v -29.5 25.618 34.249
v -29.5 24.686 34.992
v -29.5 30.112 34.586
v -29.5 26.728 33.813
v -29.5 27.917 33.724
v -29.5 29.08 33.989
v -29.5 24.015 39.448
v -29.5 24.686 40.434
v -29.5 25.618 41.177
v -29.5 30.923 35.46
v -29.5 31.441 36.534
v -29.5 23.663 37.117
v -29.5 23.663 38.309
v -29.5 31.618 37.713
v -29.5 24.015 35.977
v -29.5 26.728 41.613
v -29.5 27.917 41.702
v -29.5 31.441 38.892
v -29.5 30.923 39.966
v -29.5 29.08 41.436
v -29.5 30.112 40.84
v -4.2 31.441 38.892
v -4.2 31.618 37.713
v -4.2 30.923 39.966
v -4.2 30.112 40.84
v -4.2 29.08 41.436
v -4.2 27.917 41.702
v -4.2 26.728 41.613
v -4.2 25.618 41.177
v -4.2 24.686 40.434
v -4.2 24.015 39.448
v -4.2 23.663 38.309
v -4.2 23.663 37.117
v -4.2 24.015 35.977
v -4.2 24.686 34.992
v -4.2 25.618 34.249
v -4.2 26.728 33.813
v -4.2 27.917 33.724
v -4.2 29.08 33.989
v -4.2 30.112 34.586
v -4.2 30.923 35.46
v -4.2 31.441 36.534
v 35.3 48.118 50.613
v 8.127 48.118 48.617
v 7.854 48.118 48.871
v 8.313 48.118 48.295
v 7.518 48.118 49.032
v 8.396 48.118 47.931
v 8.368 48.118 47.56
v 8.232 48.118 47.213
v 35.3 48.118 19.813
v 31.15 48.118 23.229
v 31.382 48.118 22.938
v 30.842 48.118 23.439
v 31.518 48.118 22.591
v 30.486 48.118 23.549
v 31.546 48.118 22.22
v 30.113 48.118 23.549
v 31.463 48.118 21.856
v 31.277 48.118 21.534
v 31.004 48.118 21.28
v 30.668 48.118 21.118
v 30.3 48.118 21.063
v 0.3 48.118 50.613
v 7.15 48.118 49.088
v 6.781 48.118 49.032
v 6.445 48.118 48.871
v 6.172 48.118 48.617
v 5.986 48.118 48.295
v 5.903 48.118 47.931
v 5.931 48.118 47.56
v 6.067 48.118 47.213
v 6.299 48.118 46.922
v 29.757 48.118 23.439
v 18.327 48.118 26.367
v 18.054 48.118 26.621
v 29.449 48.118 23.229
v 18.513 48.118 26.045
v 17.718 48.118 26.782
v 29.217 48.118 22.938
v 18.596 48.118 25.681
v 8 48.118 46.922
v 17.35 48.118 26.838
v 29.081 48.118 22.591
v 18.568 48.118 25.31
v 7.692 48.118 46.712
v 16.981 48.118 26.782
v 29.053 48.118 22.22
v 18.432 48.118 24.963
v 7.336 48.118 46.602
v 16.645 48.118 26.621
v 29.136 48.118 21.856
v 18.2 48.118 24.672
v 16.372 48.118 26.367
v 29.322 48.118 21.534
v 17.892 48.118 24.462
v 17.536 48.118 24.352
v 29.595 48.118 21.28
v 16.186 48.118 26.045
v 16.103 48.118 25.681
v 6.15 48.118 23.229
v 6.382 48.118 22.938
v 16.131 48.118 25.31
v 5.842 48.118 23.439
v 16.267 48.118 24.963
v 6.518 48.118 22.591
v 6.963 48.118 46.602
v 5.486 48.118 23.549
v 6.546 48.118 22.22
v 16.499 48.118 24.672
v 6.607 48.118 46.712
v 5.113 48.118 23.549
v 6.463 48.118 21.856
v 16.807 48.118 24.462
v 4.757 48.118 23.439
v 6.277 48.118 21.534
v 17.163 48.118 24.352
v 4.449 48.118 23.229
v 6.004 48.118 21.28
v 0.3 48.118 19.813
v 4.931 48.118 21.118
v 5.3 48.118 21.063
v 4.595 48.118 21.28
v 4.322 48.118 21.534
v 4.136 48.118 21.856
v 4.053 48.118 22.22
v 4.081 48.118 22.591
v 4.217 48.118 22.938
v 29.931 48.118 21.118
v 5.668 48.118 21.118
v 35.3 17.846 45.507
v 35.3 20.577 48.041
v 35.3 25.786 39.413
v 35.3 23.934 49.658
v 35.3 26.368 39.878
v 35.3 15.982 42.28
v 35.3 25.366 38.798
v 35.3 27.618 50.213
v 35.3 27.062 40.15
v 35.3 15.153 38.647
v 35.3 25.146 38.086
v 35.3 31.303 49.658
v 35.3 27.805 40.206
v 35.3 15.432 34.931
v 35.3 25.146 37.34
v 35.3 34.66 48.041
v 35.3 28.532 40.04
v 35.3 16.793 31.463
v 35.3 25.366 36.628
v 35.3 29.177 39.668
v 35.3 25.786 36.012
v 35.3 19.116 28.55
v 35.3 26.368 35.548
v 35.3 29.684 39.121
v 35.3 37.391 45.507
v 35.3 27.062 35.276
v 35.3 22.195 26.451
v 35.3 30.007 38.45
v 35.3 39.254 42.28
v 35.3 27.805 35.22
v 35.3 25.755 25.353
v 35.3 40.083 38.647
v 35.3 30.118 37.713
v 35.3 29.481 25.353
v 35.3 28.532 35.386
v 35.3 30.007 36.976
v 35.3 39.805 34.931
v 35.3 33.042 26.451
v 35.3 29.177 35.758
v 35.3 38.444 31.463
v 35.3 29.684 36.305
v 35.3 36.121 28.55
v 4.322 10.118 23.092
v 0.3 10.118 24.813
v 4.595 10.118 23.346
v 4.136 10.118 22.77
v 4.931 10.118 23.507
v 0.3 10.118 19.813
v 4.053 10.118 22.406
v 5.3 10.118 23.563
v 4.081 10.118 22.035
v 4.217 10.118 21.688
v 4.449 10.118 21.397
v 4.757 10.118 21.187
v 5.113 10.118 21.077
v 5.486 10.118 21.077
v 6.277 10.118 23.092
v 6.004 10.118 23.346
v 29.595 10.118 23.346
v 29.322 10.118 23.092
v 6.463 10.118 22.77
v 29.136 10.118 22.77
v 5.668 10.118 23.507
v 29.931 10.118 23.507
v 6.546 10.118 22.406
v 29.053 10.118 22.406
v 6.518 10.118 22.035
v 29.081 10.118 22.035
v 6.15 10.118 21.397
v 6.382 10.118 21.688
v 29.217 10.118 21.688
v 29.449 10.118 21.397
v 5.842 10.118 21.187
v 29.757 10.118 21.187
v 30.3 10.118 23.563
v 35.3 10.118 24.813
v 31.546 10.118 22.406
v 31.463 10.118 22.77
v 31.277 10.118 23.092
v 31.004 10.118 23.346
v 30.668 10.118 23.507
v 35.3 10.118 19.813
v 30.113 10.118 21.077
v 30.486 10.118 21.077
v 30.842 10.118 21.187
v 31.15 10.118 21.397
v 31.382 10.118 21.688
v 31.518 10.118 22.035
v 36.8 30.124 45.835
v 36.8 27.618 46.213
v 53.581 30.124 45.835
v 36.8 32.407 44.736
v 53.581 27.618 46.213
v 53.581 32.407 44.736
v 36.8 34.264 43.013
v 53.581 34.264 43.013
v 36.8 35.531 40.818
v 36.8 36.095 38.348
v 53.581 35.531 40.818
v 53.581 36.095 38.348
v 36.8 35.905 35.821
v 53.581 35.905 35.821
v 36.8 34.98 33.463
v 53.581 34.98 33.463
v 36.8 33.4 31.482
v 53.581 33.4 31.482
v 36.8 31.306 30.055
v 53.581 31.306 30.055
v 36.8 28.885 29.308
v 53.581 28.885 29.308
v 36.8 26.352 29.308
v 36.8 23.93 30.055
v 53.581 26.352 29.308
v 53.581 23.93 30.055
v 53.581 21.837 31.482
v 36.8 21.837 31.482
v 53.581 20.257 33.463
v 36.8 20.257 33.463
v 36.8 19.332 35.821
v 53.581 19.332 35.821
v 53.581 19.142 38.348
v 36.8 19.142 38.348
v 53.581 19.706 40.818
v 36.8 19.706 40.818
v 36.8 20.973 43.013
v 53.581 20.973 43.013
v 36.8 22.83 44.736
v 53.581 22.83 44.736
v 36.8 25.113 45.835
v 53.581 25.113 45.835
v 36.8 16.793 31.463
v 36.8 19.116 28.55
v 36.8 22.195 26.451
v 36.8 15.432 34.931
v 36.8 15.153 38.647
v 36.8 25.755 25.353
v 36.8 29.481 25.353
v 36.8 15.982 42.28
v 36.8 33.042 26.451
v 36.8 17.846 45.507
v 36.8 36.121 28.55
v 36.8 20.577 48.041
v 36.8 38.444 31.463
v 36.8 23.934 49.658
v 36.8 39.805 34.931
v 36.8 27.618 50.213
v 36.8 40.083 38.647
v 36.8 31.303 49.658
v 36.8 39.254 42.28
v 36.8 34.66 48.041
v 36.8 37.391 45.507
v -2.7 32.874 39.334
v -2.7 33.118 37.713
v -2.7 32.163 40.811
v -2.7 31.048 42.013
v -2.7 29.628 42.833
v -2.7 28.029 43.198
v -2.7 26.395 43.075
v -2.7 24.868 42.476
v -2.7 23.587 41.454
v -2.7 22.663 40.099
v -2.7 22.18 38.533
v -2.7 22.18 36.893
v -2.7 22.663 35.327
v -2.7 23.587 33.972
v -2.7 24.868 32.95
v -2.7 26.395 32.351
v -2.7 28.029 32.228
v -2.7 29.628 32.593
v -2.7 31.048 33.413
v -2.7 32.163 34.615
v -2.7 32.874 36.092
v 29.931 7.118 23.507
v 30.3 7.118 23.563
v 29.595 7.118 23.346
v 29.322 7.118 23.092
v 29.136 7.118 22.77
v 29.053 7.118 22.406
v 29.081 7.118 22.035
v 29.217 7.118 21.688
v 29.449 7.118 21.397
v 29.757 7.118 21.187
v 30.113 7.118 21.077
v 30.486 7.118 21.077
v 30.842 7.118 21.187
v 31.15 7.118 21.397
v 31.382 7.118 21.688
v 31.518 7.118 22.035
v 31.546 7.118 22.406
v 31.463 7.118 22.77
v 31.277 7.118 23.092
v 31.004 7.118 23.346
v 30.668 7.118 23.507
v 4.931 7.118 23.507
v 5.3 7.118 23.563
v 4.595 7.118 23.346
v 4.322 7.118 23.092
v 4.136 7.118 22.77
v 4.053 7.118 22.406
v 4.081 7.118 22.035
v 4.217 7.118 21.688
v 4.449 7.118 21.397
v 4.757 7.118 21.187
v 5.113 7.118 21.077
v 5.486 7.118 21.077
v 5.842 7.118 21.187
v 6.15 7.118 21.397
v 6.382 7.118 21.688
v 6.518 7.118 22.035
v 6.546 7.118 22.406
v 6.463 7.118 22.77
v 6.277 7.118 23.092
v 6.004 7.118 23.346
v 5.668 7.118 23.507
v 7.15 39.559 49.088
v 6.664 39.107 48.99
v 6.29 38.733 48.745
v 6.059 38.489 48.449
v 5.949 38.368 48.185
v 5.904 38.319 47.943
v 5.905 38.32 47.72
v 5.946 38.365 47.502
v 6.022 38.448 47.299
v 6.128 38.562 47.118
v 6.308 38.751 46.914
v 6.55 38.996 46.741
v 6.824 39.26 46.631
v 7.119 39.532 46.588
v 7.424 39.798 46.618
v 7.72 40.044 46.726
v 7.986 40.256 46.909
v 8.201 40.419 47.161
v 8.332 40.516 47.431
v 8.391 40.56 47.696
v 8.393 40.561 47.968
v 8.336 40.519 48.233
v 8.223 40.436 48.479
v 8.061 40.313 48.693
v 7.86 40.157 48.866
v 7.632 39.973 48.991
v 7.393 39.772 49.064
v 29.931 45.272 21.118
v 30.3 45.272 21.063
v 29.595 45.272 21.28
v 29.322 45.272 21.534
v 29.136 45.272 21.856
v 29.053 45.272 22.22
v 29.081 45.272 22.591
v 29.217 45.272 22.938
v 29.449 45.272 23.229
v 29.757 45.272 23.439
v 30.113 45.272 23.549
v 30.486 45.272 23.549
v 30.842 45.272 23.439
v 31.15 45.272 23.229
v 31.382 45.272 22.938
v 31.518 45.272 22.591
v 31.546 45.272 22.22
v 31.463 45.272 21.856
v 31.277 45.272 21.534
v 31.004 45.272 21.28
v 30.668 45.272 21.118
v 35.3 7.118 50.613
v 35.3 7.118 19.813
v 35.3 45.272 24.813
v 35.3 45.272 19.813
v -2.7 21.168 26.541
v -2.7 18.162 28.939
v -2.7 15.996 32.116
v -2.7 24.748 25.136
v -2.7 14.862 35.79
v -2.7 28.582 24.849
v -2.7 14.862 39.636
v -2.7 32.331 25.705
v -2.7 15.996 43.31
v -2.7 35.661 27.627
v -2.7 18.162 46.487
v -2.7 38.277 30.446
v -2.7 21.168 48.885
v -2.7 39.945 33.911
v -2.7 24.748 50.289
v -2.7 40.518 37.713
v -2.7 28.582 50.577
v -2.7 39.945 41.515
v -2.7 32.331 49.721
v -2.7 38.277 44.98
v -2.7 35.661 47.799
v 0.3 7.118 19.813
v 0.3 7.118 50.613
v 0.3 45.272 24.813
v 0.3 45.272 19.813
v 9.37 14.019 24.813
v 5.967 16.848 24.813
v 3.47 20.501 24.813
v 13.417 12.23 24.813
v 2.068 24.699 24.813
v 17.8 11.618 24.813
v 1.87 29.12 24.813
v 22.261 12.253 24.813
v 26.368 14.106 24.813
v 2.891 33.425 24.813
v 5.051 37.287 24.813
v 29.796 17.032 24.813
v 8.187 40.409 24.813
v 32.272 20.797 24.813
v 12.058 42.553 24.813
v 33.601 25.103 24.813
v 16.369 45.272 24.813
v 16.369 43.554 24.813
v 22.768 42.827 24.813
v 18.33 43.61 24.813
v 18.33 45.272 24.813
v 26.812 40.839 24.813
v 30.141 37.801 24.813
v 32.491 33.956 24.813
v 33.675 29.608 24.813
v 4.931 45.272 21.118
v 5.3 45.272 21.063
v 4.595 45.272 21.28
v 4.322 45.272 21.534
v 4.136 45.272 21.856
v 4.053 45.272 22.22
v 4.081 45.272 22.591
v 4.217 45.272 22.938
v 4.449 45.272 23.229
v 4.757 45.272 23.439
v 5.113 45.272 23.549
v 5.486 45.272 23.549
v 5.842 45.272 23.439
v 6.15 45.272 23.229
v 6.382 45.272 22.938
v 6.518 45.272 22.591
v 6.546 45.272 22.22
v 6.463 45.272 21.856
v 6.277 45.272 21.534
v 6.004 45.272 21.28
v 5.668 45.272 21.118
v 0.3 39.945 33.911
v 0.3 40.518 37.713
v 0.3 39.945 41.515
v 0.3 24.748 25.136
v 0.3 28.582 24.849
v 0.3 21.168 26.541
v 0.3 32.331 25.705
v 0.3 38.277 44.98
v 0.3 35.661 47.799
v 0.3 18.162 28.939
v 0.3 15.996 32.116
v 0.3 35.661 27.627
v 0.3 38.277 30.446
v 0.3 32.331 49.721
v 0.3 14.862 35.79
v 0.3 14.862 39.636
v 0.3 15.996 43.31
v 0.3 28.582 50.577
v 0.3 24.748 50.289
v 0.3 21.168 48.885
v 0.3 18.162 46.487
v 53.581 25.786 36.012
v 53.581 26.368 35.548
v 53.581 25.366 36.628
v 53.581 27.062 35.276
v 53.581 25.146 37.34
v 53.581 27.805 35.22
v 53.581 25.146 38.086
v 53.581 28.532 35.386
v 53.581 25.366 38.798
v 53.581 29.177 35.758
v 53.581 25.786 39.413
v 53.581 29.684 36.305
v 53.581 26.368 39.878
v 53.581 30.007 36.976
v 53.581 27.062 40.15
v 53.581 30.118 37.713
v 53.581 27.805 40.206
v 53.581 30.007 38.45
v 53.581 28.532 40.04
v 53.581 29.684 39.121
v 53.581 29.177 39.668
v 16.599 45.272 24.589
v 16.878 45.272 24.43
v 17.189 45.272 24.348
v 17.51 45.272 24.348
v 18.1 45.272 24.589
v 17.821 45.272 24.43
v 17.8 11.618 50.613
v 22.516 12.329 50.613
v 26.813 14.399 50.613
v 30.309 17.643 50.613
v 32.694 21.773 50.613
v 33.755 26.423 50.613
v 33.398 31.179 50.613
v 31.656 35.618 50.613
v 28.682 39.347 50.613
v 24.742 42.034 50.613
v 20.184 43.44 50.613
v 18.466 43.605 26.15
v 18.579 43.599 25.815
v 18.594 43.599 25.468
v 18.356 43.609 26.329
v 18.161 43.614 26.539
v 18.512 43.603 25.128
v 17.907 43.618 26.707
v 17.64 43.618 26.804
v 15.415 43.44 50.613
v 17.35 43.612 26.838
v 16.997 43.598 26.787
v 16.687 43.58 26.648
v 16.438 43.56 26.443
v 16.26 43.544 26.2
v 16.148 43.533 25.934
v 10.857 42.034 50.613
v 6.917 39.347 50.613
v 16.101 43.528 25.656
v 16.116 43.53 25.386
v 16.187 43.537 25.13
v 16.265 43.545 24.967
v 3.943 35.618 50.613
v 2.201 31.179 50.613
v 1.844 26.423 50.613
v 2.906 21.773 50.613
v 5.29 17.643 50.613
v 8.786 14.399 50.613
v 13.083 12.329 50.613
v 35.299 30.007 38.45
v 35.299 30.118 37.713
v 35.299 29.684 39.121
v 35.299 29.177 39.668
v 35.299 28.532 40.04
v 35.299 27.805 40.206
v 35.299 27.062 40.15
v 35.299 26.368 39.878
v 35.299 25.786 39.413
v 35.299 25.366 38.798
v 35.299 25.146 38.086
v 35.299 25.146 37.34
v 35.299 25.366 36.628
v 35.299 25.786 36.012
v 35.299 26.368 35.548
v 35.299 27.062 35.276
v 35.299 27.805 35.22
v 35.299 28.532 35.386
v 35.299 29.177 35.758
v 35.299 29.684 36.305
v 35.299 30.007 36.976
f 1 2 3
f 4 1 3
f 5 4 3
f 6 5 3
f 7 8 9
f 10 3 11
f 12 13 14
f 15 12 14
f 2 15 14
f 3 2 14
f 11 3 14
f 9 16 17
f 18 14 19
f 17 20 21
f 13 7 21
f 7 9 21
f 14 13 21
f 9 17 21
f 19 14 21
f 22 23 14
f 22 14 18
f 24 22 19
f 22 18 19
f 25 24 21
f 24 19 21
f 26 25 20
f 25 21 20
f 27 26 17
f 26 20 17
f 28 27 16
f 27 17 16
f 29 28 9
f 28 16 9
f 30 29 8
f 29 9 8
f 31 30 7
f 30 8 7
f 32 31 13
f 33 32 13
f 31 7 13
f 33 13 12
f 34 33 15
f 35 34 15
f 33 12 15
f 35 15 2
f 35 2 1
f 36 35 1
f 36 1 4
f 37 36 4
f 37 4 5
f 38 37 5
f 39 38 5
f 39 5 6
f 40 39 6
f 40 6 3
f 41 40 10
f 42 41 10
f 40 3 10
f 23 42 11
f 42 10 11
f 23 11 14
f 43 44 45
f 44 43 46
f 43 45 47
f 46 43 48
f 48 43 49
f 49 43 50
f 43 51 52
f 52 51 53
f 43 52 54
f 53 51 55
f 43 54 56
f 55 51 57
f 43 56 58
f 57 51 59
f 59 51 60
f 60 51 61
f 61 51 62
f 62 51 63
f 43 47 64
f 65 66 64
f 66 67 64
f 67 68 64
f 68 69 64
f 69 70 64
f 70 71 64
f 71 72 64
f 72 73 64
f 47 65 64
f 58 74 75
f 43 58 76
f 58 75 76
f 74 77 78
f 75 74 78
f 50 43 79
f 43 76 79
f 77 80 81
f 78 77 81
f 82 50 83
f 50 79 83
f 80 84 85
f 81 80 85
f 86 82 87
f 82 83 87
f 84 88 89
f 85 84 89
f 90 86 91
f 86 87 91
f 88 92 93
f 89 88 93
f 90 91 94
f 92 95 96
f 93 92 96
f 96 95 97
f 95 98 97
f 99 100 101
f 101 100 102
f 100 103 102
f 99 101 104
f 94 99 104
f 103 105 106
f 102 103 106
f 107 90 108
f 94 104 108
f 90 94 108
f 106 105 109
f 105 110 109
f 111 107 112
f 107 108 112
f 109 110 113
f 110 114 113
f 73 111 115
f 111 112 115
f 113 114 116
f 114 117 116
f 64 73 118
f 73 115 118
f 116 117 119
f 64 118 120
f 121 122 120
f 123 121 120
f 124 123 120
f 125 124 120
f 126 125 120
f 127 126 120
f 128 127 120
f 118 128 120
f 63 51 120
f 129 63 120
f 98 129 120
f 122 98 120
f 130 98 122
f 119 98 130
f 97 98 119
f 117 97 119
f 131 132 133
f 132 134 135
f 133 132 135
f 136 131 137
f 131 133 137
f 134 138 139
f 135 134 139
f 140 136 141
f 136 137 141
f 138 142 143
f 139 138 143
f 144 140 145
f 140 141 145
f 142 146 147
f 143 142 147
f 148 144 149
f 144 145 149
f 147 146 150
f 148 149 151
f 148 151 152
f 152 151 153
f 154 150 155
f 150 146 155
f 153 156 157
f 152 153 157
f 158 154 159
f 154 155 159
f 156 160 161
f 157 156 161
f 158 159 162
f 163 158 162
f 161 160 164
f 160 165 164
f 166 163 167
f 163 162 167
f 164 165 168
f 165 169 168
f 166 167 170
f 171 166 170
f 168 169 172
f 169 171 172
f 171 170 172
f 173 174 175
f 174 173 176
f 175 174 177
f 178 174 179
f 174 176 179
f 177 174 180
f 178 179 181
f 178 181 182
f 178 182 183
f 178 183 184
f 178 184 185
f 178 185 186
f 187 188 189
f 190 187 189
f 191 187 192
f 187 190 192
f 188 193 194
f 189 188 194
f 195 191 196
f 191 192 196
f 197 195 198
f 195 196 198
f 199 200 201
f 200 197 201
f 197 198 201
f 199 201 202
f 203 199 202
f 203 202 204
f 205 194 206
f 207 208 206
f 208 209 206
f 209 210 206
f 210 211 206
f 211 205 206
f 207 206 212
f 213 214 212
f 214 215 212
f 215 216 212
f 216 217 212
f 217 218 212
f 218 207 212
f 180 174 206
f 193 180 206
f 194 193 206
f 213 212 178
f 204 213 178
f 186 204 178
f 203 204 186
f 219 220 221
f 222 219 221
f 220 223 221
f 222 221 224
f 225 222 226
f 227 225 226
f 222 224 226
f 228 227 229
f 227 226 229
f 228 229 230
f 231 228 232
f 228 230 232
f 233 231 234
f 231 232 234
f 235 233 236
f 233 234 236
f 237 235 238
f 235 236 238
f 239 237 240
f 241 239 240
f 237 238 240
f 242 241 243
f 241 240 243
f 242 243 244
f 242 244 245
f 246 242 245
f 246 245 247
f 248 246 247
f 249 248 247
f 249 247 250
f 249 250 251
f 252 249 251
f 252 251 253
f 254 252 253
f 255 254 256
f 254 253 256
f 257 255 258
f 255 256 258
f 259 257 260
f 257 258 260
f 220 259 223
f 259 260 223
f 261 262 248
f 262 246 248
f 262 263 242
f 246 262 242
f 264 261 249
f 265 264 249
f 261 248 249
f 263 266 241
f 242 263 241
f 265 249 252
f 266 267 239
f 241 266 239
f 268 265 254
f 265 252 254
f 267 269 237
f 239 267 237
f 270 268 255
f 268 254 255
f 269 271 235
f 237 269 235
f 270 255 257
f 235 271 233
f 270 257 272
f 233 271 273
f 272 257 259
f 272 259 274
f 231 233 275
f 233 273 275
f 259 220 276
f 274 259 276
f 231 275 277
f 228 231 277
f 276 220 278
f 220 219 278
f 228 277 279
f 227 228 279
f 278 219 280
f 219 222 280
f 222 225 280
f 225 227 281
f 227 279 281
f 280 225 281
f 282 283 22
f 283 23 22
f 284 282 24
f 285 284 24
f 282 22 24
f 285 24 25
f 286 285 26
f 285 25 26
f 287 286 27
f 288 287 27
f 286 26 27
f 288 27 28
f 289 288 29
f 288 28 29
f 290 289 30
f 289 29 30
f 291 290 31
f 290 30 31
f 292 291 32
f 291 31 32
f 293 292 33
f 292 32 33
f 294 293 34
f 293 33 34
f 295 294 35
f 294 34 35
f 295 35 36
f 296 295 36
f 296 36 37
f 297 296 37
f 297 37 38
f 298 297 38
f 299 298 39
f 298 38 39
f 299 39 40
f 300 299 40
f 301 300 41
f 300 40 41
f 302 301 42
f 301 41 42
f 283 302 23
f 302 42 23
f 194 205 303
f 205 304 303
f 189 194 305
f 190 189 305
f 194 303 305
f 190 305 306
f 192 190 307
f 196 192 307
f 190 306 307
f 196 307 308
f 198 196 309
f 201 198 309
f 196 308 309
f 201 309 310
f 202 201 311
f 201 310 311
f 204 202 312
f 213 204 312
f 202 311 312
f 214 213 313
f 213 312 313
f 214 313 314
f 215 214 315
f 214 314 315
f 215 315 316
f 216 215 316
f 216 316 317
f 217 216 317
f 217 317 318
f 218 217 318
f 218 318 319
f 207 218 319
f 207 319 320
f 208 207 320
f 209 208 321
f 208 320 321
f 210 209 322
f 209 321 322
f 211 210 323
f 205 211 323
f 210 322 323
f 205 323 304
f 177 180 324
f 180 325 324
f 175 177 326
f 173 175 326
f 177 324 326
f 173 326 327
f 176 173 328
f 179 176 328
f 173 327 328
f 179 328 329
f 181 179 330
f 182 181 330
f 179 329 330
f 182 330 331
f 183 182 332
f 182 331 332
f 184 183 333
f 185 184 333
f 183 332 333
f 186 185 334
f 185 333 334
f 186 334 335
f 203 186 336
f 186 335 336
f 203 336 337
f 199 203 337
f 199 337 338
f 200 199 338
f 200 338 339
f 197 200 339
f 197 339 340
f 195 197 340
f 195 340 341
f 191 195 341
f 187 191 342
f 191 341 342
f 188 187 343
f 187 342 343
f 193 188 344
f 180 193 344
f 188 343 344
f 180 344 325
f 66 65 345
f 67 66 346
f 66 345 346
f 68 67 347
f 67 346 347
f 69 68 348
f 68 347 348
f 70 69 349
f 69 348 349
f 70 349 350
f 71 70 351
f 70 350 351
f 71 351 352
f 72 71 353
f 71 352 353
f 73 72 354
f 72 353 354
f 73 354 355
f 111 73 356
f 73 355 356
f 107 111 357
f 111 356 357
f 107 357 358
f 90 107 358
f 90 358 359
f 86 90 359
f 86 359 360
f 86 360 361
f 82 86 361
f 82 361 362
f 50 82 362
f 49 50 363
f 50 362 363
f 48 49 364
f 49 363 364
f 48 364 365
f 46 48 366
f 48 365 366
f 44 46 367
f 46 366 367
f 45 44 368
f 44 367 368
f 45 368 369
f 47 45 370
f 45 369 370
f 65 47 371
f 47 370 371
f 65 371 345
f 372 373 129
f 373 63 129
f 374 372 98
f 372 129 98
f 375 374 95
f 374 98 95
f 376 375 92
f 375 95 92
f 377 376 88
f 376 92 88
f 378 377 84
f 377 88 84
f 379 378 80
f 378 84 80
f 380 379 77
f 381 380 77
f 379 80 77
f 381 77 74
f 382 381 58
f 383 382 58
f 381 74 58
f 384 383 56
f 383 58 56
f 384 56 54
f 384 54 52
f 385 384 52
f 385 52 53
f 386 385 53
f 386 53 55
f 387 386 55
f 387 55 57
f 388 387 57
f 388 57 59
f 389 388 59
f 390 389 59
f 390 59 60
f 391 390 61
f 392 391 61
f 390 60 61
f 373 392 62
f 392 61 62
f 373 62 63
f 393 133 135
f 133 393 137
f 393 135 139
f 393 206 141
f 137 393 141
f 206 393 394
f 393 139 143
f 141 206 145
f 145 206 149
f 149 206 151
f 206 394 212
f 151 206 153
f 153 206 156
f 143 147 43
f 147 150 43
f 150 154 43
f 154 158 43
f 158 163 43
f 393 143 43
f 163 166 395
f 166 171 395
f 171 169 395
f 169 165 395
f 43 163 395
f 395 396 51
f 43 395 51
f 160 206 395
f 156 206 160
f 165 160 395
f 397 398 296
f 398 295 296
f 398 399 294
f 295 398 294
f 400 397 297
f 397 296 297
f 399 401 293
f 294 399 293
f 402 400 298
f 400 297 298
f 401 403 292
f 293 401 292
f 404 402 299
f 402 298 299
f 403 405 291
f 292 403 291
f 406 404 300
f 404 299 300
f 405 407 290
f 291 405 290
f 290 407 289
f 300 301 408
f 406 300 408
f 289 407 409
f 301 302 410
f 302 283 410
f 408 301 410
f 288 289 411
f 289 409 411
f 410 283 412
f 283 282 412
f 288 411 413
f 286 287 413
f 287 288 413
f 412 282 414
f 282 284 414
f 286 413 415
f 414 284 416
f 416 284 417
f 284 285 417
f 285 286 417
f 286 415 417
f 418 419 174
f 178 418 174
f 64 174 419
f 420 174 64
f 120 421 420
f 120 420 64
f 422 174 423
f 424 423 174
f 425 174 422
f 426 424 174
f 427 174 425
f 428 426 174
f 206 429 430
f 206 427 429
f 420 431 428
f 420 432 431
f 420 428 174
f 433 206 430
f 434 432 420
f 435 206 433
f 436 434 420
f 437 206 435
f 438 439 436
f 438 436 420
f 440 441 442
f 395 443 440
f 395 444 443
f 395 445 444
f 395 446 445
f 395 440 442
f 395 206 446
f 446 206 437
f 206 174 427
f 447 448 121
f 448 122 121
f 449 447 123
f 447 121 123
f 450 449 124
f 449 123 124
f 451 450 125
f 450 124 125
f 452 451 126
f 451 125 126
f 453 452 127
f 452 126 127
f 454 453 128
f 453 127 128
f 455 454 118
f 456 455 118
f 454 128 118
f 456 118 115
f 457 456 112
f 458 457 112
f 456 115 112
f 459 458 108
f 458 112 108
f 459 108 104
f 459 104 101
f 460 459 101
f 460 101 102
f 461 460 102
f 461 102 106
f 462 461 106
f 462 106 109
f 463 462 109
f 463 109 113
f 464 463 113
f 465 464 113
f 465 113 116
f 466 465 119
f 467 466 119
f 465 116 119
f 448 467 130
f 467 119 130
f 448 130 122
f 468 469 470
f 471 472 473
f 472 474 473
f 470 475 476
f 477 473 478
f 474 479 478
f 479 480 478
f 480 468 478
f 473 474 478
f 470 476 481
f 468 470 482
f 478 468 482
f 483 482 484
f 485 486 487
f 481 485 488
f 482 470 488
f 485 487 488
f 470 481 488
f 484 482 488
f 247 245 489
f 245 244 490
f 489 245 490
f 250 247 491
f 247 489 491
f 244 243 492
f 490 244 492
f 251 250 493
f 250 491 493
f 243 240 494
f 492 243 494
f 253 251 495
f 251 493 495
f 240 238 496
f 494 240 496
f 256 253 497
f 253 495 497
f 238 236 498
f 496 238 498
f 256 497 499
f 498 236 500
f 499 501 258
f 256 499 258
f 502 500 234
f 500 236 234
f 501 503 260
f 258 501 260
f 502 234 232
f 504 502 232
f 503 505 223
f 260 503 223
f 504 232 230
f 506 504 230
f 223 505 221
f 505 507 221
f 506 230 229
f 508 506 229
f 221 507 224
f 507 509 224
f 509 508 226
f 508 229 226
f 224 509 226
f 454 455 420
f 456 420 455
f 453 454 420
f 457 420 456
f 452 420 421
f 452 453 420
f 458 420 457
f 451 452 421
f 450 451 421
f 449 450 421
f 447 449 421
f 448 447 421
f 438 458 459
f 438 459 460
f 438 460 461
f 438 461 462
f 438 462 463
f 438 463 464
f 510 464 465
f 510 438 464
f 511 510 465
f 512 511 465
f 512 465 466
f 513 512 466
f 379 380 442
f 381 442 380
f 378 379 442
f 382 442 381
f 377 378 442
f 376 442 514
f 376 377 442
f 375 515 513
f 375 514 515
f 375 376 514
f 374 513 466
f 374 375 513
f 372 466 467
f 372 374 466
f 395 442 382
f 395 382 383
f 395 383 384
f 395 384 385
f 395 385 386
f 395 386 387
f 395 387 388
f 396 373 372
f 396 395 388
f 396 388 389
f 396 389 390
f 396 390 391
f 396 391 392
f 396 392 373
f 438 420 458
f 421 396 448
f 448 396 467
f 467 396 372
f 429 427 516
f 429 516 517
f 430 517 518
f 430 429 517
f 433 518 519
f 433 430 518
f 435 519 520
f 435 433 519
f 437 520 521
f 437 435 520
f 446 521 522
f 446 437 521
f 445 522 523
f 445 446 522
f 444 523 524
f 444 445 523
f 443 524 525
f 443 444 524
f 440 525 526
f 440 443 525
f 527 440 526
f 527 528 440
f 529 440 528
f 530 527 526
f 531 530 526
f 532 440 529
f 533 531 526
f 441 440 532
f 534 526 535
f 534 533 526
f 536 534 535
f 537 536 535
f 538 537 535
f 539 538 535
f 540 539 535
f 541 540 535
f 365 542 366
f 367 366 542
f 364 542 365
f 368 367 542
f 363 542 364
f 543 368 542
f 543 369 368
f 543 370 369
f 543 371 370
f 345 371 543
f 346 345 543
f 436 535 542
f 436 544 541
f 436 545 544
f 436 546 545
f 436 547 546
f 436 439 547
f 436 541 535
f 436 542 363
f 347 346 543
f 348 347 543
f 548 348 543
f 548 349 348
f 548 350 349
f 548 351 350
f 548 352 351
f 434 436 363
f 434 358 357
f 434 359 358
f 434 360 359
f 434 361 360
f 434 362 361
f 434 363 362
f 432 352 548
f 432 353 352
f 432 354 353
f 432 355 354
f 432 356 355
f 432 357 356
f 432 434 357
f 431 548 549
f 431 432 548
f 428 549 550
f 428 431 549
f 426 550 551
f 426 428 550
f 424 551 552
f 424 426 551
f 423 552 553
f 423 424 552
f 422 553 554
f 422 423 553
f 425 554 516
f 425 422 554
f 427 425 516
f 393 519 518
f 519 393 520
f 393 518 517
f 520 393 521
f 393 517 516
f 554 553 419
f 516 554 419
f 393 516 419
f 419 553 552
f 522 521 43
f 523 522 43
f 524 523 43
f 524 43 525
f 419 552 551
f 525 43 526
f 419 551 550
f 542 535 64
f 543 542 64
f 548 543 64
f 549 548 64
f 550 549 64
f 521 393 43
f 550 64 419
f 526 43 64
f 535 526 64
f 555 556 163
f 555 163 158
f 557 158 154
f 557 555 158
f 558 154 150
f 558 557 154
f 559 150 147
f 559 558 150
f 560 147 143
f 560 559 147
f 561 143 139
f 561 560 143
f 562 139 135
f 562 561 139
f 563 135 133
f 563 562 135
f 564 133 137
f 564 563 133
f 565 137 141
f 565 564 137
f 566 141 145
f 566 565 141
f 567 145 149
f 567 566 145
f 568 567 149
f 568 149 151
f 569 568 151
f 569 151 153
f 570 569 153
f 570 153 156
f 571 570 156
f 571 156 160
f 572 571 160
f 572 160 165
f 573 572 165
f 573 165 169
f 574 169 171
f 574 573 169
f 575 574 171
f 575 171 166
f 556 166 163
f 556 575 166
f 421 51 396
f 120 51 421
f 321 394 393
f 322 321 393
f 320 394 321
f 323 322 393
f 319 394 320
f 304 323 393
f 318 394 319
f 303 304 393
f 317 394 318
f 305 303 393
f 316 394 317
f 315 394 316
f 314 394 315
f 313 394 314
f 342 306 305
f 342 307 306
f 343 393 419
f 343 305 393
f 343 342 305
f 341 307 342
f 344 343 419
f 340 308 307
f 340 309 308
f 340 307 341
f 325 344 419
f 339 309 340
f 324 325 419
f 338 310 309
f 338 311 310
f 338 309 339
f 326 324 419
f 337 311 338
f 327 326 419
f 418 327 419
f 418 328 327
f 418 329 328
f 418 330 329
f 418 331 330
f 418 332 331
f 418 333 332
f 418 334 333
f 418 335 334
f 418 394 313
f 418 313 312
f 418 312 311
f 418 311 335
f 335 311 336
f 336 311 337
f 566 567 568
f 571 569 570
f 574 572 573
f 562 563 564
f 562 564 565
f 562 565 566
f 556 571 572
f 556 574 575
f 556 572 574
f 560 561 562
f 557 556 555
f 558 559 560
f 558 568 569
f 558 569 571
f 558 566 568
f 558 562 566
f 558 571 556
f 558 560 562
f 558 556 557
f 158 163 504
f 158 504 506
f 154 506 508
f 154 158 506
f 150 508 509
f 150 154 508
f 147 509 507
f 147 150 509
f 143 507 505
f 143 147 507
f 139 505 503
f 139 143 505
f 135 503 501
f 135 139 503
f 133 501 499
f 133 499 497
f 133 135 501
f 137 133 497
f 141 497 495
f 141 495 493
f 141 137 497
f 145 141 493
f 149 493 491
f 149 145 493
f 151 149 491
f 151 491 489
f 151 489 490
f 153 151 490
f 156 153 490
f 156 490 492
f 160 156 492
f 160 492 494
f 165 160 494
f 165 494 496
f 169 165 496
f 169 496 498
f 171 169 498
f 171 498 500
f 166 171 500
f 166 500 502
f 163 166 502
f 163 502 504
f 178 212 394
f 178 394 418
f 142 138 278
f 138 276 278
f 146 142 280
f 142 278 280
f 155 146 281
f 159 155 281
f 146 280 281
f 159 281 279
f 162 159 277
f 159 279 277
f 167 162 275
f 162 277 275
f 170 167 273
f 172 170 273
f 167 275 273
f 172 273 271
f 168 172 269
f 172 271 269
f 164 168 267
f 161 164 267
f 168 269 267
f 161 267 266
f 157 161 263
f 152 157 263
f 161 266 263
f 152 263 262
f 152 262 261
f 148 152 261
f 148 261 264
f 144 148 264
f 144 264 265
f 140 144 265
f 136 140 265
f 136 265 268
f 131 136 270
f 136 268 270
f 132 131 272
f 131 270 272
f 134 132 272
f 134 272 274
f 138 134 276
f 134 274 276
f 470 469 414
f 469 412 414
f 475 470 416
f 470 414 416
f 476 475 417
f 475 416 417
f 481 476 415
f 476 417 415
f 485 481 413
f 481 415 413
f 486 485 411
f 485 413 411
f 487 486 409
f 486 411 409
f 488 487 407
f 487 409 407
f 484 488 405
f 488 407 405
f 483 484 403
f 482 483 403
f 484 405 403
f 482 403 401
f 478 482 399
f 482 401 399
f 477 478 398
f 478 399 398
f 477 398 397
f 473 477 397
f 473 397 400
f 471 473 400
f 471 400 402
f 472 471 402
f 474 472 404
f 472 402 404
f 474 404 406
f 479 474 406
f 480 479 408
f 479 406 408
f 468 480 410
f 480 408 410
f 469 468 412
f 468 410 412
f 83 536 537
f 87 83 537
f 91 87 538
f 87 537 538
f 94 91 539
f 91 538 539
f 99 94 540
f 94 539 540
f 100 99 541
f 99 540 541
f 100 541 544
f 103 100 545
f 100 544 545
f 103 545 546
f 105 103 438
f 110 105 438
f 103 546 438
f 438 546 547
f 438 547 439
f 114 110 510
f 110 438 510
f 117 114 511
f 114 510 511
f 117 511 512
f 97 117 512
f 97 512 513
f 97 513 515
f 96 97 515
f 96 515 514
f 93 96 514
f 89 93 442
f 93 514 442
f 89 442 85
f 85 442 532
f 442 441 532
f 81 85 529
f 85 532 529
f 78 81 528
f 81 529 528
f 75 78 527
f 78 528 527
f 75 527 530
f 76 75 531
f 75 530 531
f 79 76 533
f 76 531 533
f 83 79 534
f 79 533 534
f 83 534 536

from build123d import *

# Parameters (mm, degrees)
SKETCH24_W                     = 35
SKETCH24_H                     = 41
BOSS_EXTRUDE2_DEPTH            = 30.8
SKETCH30_W                     = 5
SKETCH30_H                     = 35.1536
CUT_EXTRUDE2_DEPTH             = 96.268509944
SKETCH38_W                     = 16
SKETCH38_H                     = 30.8
F_10_START                     = 35.298543859
F_10_CLEARANCE_HOLE2_OUTLINE_R = 2.5
F_10_CLEARANCE_HOLE2_DEPTH     = 18.2822
SKETCH42_W                     = 1.25
SKETCH42_H                     = 20.5
SKETCH44_W                     = 1.25
SKETCH44_H                     = 20.5
SKETCH46_W                     = 1.25
SKETCH46_H                     = 2.8464
F_2_CLEARANCE_HOLE7_AT_2_COUNT = 2
F_2_CLEARANCE_HOLE7_AT_2_PITCH = 25
SKETCH48_W                     = 1.25
SKETCH48_H                     = 3
F_2_CLEARANCE_HOLE8_AT_2_COUNT = 2
F_2_CLEARANCE_HOLE8_AT_2_PITCH = 25


# Read off the part's stored shape, not the designer's step: #10 Clearance Hole2
with BuildPart() as part:
    # Sketch19 → Revolve2 (revolve)
    with BuildSketch(Plane.XY.offset(37.712926777)):
        Polygon((-29.500456141, 31.618402197), (-29.500456141, 27.618402197), (0.299543859, 27.618402197), (0.299543859, 40.518402197), (-2.700456141, 40.518402197), (-2.700456141, 33.118402196), (-4.200456141, 31.618402197), align=None)
    revolve(axis=Axis((-29.500456141, 27.618402197, 37.712926777), (1, 0, 0)))


with BuildPart() as body_2:
    # Sketch24 → Boss-Extrude2 (new body)
    with BuildSketch(Plane(origin=(0, 0, 19.812926777), x_dir=(-1, 0, 0), z_dir=(0, 0, -1))):
        with Locations((-17.799543859, 27.618402197)):
            Rectangle(SKETCH24_W, SKETCH24_H)
    extrude(amount=-BOSS_EXTRUDE2_DEPTH)

    # Sketch30 → Cut-Extrude2 (cut, through all)
    with BuildSketch(Plane(origin=(35.299543859, 0, 0), x_dir=(0, 0, -1), z_dir=(1, 0, 0))):
        with Locations((-22.312926777, 27.695202197)):
            Rectangle(SKETCH30_W, SKETCH30_H)
    extrude(amount=-CUT_EXTRUDE2_DEPTH, mode=Mode.SUBTRACT)

    # Sketch38 → Hole2 (revolve, cut)
    with BuildSketch(Plane(origin=(17.799543859, 27.618402197, 50.612926777), x_dir=(0, -1, 0), z_dir=(1, 0, 0))):
        with Locations((8, 15.4)):
            Rectangle(SKETCH38_W, SKETCH38_H)
    revolve(axis=Axis((17.799543859, 27.618402197, -59.387073223), (0, 0, 1)), mode=Mode.SUBTRACT)


with BuildPart() as body_3:
    # Sketch37 → Revolve3 (revolve)
    with BuildSketch(Plane(origin=(0, 0, 37.712926777), x_dir=(-1, 0, 0), z_dir=(0, 0, -1)), mode=Mode.PRIVATE) as revolve3_sk:
        Polygon((-53.580743859, 36.118402197), (-53.580743859, 27.618402197), (-35.299543859, 27.618402197), (-35.299543859, 40.118402197), (-36.799543859, 40.118402197), (-36.799543859, 36.118402197), align=None)
    revolve(revolve3_sk.sketch.rotate(Axis((53.580743859, 27.618402197, 37.712926777), (-1, 0, 0)), 270), axis=Axis((53.580743859, 27.618402197, 37.712926777), (-1, 0, 0)))


with BuildPart() as f_10_clearance_hole2_tool:
    # #10 Clearance Hole2 outline → #10 Clearance Hole2 (new body)
    with BuildSketch(Plane.YZ.offset(F_10_START)):
        with Locations((27.618402197, 37.712926777)):
            Circle(F_10_CLEARANCE_HOLE2_OUTLINE_R)
    extrude(amount=F_10_CLEARANCE_HOLE2_DEPTH)


with BuildPart() as body_2_1:
    add(body_2.part)

    # #10 Clearance Hole2: cut by f_10_clearance_hole2_tool
    add(f_10_clearance_hole2_tool.part, mode=Mode.SUBTRACT)

    # Sketch42 → #2 Clearance Hole5 (revolve, cut)
    with BuildSketch(Plane(origin=(7.149543859, 48.118402197, 47.837926777), x_dir=(0, 0, 1), z_dir=(1, 0, 0))):
        with Locations((0.625, 10.25)):
            Rectangle(SKETCH42_W, SKETCH42_H)
    revolve(axis=Axis((7.149543859, 54.468402197, 47.837926777), (0, -1, 0)), mode=Mode.SUBTRACT)

    # Sketch44 → #2 Clearance Hole6 (revolve, cut)
    with BuildSketch(Plane(origin=(17.349543859, 48.118402197, 25.587926777), x_dir=(0, 0, 1), z_dir=(1, 0, 0))):
        with Locations((0.625, 10.25)):
            Rectangle(SKETCH44_W, SKETCH44_H)
    revolve(axis=Axis((17.349543859, 54.468402197, 25.587926777), (0, -1, 0)), mode=Mode.SUBTRACT)

    # Sketch46 → #2 Clearance Hole7 (revolve, cut)
    with BuildSketch(Plane(origin=(5.299543859, 45.272002197, 22.312926777), x_dir=(0, 0, -1), z_dir=(1, 0, 0))):
        with Locations((0.625, 1.4232)):
            Rectangle(SKETCH46_W, SKETCH46_H)
    f_2_clearance_hole7 = revolve(axis=Axis((5.299543859, 38.922002197, 22.312926777), (0, 1, 0)), mode=Mode.SUBTRACT)

    # #2 Clearance Hole7 at 2: #2 Clearance Hole7 ×2
    with Locations(*[(i * F_2_CLEARANCE_HOLE7_AT_2_PITCH, 0, 0) for i in range(1, F_2_CLEARANCE_HOLE7_AT_2_COUNT)]):
        add(f_2_clearance_hole7, mode=Mode.SUBTRACT)

    # Sketch48 → #2 Clearance Hole8 (revolve, cut)
    with BuildSketch(Plane(origin=(5.299543859, 10.118402197, 22.312926777), x_dir=(0, 0, 1), z_dir=(1, 0, 0))):
        with Locations((0.625, 1.5)):
            Rectangle(SKETCH48_W, SKETCH48_H)
    f_2_clearance_hole8 = revolve(axis=Axis((5.299543859, 16.468402197, 22.312926777), (0, -1, 0)), mode=Mode.SUBTRACT)

    # #2 Clearance Hole8 at 2: #2 Clearance Hole8 ×2
    with Locations(*[(i * F_2_CLEARANCE_HOLE8_AT_2_PITCH, 0, 0) for i in range(1, F_2_CLEARANCE_HOLE8_AT_2_COUNT)]):
        add(f_2_clearance_hole8, mode=Mode.SUBTRACT)


with BuildPart() as body_3_1:
    add(body_3.part)

    # #10 Clearance Hole2: cut by f_10_clearance_hole2_tool
    add(f_10_clearance_hole2_tool.part, mode=Mode.SUBTRACT)


solid = Compound([part.part, body_2_1.part, body_3_1.part])
